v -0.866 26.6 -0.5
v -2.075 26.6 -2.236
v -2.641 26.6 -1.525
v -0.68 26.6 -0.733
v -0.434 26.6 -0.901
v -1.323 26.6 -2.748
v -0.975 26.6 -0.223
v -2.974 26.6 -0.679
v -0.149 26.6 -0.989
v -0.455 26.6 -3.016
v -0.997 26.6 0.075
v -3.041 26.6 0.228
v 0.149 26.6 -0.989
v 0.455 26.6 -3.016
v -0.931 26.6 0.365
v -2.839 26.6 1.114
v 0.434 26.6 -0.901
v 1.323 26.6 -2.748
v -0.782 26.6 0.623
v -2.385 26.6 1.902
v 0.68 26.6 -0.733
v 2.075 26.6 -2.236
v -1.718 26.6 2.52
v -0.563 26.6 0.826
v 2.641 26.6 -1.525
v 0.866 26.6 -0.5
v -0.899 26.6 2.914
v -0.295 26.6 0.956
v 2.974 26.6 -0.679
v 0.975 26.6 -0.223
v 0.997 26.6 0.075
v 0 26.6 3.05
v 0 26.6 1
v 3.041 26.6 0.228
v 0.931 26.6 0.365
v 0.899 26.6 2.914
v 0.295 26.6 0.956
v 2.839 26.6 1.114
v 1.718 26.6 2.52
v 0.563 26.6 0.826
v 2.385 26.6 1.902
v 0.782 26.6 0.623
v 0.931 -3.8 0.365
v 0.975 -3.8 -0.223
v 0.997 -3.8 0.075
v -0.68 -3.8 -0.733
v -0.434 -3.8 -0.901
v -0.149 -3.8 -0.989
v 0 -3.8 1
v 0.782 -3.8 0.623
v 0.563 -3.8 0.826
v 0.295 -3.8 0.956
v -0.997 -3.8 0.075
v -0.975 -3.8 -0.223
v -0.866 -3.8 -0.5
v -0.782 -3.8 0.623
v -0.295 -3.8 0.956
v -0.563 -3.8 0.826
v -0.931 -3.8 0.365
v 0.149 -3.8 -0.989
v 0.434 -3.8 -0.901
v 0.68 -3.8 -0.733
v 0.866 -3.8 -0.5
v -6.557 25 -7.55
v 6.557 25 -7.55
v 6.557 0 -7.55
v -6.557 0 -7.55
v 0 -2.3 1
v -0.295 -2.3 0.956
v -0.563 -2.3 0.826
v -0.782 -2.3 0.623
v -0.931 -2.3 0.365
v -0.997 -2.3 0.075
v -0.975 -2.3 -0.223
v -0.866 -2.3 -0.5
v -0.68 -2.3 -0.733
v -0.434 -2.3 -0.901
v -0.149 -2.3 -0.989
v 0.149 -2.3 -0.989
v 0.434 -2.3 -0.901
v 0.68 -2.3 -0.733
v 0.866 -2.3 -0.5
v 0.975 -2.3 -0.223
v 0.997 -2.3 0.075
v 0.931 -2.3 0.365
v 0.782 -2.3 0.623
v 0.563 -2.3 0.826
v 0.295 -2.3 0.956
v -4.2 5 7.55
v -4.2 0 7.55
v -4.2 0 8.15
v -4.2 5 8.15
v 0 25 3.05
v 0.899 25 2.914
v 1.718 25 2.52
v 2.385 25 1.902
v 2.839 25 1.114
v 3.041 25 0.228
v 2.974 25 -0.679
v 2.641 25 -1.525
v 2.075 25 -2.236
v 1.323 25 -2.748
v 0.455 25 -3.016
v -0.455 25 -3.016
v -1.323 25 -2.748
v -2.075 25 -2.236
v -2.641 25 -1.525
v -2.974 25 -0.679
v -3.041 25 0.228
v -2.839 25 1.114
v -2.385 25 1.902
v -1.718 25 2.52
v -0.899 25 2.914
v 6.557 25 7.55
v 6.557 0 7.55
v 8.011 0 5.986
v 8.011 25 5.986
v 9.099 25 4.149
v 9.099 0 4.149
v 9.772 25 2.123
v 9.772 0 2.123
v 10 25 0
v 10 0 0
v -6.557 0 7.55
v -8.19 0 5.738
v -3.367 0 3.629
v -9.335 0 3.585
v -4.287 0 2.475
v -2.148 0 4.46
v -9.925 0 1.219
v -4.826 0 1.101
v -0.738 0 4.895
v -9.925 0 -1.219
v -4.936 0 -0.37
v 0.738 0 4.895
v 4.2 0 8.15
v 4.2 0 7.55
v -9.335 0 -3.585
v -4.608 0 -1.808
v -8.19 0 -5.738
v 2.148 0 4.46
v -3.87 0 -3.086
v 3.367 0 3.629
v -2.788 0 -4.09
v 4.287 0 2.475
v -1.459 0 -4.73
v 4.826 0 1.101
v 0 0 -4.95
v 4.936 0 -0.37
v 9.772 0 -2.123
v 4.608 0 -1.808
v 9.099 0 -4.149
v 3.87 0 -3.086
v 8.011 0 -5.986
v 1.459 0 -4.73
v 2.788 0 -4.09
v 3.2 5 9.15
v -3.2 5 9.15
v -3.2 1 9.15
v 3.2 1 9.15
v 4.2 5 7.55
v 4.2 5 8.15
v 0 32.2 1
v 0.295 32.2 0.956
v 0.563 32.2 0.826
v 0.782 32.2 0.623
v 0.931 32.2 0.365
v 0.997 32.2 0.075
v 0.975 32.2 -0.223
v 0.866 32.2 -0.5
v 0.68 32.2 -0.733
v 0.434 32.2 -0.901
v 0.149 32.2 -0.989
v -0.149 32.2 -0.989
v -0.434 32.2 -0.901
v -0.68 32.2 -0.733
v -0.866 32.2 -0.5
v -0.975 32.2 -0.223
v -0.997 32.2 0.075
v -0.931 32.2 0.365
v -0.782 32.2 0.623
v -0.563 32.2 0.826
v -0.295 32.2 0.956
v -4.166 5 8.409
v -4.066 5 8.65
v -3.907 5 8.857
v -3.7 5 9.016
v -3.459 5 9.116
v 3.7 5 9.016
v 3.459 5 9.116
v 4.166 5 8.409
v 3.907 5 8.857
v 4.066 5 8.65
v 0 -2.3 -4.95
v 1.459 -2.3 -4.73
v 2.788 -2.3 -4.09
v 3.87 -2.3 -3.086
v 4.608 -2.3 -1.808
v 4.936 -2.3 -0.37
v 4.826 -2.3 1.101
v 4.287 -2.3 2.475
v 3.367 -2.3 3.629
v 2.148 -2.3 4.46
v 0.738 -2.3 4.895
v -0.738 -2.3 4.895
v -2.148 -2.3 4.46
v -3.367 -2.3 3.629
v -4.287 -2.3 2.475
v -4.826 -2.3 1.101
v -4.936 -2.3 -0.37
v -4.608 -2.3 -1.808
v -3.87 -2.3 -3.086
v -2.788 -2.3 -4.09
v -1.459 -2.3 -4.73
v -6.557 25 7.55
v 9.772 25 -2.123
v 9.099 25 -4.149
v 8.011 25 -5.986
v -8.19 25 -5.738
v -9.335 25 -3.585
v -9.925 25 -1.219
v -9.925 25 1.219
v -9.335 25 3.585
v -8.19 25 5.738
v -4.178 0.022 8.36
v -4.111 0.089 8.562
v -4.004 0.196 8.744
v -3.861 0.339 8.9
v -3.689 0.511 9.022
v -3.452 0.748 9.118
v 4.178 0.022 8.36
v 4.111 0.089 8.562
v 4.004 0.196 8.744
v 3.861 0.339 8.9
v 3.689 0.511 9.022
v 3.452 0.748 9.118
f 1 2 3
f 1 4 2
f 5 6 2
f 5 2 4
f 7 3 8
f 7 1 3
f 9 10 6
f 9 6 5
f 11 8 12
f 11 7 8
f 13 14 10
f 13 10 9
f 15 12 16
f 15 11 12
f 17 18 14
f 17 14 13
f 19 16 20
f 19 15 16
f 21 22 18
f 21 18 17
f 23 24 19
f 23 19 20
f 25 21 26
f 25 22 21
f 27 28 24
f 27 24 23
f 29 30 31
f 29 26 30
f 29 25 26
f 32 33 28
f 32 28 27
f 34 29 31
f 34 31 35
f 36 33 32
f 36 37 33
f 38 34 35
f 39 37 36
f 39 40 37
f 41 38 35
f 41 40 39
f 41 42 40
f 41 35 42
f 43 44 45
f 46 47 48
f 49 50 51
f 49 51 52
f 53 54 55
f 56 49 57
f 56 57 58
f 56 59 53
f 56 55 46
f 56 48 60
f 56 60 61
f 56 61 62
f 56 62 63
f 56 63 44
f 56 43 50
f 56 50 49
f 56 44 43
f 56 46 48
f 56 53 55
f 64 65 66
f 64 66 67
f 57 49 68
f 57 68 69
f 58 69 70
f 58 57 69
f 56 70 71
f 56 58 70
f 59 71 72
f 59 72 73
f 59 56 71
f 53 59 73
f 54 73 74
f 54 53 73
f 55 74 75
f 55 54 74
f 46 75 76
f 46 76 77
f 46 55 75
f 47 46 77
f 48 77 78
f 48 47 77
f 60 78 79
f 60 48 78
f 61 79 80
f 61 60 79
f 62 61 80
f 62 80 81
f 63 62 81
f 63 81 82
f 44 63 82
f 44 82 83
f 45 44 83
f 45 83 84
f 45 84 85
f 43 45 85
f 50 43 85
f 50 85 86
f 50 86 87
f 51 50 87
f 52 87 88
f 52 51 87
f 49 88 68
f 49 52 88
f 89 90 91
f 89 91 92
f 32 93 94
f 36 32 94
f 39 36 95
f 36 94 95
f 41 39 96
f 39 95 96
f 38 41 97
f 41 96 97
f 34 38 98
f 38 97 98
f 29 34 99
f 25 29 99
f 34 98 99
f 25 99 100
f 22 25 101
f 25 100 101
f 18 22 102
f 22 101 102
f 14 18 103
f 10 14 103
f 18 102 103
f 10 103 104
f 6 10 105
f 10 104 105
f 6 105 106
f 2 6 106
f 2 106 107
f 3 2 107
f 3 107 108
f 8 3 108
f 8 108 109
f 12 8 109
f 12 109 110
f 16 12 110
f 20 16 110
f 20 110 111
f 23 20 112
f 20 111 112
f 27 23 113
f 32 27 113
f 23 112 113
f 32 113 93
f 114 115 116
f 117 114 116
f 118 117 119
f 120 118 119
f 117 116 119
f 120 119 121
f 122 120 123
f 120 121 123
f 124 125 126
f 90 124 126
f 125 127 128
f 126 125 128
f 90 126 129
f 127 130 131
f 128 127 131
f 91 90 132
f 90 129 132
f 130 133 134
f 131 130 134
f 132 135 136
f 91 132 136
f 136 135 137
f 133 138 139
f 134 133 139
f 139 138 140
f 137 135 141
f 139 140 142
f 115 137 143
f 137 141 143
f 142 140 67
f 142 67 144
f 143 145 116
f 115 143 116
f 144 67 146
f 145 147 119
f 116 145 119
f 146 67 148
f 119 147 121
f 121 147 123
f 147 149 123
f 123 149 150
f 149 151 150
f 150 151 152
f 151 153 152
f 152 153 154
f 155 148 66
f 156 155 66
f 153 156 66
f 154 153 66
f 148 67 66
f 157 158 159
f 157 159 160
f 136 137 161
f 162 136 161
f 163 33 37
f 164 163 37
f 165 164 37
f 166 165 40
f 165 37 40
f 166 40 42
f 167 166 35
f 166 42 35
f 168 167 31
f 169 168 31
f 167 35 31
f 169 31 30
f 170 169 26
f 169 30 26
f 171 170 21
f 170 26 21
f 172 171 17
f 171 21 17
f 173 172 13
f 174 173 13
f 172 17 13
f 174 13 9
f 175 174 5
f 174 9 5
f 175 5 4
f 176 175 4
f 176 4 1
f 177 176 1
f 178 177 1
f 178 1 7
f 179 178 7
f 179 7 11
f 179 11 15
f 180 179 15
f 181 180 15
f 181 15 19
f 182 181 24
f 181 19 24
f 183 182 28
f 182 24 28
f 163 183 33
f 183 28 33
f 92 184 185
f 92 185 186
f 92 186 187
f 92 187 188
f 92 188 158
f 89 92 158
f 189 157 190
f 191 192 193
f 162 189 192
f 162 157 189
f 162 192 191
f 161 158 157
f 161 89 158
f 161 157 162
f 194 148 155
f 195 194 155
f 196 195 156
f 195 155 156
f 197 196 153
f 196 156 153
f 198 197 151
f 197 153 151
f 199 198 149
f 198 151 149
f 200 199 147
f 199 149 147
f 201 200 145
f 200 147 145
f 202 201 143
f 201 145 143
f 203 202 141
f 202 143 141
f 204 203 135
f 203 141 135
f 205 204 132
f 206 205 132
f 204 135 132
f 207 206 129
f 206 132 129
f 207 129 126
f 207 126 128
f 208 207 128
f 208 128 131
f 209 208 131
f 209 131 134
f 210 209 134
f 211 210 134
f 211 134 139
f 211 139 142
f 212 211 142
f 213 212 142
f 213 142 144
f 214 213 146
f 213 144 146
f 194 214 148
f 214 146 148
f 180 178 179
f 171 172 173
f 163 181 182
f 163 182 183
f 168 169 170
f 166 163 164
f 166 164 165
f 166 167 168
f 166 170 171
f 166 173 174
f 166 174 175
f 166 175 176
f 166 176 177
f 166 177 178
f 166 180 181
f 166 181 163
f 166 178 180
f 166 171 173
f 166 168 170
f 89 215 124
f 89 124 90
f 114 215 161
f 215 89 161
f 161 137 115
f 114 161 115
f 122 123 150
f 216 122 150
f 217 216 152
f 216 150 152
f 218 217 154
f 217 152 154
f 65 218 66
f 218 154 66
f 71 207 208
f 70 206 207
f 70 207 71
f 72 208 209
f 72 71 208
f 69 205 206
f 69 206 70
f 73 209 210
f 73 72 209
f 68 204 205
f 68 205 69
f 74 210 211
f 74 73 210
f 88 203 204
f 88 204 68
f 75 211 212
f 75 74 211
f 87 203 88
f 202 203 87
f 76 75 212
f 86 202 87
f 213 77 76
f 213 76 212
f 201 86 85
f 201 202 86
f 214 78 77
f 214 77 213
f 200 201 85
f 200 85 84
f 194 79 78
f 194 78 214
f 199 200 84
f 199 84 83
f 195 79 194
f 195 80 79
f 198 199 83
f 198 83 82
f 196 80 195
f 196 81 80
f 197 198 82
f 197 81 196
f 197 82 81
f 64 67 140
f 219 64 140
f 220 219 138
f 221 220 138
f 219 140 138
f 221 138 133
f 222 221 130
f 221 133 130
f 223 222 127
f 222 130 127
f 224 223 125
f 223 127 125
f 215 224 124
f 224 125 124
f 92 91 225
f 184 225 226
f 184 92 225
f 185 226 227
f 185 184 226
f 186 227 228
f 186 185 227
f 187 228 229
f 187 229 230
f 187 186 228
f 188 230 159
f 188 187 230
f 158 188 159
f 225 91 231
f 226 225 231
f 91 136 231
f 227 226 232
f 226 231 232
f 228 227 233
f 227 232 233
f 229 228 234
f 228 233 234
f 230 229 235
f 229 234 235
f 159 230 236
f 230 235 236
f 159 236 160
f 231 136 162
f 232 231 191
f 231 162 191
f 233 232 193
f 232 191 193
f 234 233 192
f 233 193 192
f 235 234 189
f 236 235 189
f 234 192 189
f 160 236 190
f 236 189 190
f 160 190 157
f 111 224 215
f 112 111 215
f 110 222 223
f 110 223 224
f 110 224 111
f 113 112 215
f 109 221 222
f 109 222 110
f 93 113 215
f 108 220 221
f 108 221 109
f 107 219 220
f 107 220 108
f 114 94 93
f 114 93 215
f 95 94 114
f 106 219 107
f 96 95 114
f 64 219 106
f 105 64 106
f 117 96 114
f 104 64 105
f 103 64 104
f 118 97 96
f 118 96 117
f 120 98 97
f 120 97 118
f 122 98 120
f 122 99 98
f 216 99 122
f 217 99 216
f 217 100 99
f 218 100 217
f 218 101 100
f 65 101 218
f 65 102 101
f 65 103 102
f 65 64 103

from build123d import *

# Parameters (mm, degrees)
BOSS_EXTRUDE1_DEPTH = 25
SKETCH2_R           = 3.05
BOSS_EXTRUDE2_DEPTH = 1.6
SKETCH3_R           = 1
BOSS_EXTRUDE3_DEPTH = 5.6
SKETCH4_R           = 4.95
BOSS_EXTRUDE4_DEPTH = 2.3
BOSS_EXTRUDE5_START = 1.5
SKETCH5_R           = 1
BOSS_EXTRUDE5_DEPTH = 1.5
SKETCH6_W           = 8.4
SKETCH6_H           = 5
BOSS_EXTRUDE6_DEPTH = 1.6
FILLET1_R           = 1


with BuildPart() as part:
    # Sketch1 → Boss-Extrude1 (new body)
    with BuildSketch(Plane(origin=(0, 0, 0), x_dir=(1, 0, 0), z_dir=(0, 1, 0))):
        with BuildLine():
            Line((6.557247898, 7.55), (-6.557247898, 7.55))
            ThreePointArc((-6.557247898, 7.55), (-10, 0), (-6.557247898, -7.55))
            Line((-6.557247898, -7.55), (6.557247898, -7.55))
            ThreePointArc((6.557247898, -7.55), (9.098694384, -4.148946916), (10, 0))
            ThreePointArc((10, 0), (9.098694384, 4.148946916), (6.557247898, 7.55))
        make_face()
    extrude(amount=BOSS_EXTRUDE1_DEPTH)

    # Sketch2 → Boss-Extrude2 (add)
    with BuildSketch(Plane(origin=(0, 25, 0), x_dir=(1, 0, 0), z_dir=(0, 1, 0))):
        with Locations(Location((0, 0, 0), (0, 0, 270))):
            Circle(SKETCH2_R)
    extrude(amount=BOSS_EXTRUDE2_DEPTH)

    # Sketch3 → Boss-Extrude3 (add)
    with BuildSketch(Plane(origin=(0, 26.6, 0), x_dir=(1, 0, 0), z_dir=(0, 1, 0))):
        with Locations(Location((0, 0, 0), (0, 0, 270))):
            Circle(SKETCH3_R)
    extrude(amount=BOSS_EXTRUDE3_DEPTH)

    # Sketch4 → Boss-Extrude4 (add)
    with BuildSketch(Plane.XZ):
        with Locations(Location((0, 0, 0), (0, 0, 270))):
            Circle(SKETCH4_R)
    extrude(amount=BOSS_EXTRUDE4_DEPTH)

    # Sketch5 → Boss-Extrude5 (add)
    with BuildSketch(Plane.XZ.offset(2.3).offset(BOSS_EXTRUDE5_START)):
        with Locations(Location((0, 0, 0), (0, 0, 90))):
            Circle(SKETCH5_R)
    extrude(amount=-BOSS_EXTRUDE5_DEPTH)

    # Sketch6 → Boss-Extrude6 (add)
    with BuildSketch(Plane.XY.offset(7.55)):
        with Locations((0, 2.5)):
            Rectangle(SKETCH6_W, SKETCH6_H)
    extrude(amount=BOSS_EXTRUDE6_DEPTH)

    # Fillet1
    fillet1_edges = [part.edges().sort_by_distance(p)[0] for p in [
        (-4.2, 2.5, 9.15),
        (0, 0, 9.15),
        (4.2, 2.5, 9.15),
    ]]
    fillet(fillet1_edges, radius=FILLET1_R)


solid = part.part
